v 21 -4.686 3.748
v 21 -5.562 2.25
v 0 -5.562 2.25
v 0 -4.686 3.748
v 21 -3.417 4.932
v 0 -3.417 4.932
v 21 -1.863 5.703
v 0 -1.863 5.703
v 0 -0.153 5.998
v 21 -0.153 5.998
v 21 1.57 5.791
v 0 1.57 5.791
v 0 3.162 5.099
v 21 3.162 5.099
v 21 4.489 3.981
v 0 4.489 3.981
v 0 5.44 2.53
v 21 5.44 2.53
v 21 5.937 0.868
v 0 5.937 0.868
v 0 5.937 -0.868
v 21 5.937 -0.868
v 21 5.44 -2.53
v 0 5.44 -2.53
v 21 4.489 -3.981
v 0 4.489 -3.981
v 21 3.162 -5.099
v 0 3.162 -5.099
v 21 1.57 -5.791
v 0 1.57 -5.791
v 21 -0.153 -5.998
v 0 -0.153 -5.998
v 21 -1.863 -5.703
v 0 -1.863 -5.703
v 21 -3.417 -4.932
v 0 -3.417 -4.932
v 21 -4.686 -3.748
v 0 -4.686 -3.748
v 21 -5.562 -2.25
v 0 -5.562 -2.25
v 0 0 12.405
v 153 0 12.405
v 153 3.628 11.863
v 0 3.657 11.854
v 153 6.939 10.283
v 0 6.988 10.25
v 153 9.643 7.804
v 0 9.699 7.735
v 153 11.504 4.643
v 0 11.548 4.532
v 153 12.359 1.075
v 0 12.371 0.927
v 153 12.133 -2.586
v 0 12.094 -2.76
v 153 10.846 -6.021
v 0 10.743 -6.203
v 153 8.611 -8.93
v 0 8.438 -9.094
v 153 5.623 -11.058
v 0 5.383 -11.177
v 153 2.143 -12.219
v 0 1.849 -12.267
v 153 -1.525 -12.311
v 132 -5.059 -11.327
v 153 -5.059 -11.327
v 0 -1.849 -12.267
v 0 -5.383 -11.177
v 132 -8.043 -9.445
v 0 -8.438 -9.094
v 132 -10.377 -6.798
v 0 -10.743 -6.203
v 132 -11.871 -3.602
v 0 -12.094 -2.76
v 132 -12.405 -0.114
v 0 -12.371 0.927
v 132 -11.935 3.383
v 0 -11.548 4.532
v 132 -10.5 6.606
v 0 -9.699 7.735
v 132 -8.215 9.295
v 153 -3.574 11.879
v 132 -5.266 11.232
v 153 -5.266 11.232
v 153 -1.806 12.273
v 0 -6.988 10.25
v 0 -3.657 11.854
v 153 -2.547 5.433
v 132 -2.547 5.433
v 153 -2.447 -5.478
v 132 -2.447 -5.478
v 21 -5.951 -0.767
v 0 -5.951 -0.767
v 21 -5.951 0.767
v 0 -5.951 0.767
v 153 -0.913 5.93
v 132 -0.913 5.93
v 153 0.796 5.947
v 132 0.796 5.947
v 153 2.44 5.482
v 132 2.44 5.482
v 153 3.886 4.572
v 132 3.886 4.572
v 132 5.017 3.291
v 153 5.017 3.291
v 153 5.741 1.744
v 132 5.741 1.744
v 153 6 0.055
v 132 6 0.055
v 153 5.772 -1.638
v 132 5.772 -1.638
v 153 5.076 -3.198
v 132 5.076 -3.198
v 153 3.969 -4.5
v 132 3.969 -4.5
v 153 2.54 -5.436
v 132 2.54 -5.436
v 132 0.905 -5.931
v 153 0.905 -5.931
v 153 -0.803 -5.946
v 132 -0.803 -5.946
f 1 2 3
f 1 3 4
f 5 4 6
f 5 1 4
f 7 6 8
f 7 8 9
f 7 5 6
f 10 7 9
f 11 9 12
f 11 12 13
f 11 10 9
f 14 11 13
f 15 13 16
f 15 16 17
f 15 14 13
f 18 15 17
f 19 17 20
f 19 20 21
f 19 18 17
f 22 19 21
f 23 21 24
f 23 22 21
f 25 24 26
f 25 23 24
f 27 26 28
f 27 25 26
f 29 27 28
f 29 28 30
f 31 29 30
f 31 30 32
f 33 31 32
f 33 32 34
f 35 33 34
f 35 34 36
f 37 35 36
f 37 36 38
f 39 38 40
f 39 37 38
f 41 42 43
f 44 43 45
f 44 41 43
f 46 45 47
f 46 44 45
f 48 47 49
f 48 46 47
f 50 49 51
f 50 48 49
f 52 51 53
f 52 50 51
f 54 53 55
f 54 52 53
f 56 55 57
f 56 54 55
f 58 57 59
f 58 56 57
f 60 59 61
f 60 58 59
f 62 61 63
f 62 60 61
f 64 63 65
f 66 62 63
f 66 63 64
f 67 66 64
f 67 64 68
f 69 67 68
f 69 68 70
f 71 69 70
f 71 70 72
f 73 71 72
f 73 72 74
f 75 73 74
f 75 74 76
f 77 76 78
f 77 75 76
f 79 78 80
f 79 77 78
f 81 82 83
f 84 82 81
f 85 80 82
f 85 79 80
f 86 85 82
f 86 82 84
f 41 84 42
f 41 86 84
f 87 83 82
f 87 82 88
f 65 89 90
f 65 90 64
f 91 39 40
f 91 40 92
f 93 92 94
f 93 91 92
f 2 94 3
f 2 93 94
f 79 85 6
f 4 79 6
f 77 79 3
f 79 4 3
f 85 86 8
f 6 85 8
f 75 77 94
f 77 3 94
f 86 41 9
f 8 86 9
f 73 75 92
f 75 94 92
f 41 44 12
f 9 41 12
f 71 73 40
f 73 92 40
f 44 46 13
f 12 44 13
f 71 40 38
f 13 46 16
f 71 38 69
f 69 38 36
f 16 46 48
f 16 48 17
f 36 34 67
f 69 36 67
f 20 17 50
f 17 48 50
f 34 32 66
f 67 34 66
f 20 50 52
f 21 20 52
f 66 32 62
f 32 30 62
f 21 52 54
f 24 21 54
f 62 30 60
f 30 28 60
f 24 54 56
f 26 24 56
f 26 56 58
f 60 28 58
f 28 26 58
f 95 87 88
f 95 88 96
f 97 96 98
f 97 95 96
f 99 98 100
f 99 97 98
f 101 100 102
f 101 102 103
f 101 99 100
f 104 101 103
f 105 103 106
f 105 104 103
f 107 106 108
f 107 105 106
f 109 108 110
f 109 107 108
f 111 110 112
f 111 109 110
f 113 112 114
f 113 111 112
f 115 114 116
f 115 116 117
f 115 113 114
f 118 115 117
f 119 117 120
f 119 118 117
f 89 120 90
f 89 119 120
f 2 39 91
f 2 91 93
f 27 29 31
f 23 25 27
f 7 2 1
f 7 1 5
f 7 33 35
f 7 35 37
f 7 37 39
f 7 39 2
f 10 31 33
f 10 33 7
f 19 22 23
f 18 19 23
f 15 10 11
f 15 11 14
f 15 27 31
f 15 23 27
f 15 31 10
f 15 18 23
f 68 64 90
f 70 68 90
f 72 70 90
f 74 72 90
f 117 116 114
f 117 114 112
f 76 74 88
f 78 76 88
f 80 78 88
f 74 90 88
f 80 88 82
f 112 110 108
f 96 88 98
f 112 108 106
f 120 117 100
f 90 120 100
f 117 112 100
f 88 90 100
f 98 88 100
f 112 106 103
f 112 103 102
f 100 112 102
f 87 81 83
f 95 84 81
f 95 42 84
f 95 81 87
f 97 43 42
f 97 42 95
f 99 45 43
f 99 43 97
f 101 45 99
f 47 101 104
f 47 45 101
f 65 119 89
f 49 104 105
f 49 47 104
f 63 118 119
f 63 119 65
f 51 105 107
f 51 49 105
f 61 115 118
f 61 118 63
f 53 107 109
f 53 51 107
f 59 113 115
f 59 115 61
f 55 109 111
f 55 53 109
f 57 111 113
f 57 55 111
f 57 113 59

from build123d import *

# Parameters (mm, degrees)
IZIM1_W               = 153
IZIM1_H               = 12.405405405
KES_EKSTR_ZYON1_DEPTH = 21
KES_EKSTR_ZYON2_START = -21
KES_EKSTR_ZYON2_DEPTH = 21


with BuildPart() as part:
    # Çizim1 → Döndür1 (revolve)
    with BuildSketch(Plane(origin=(0, 0, 0), x_dir=(-1, 0, 0), z_dir=(0, 0, -1)), mode=Mode.PRIVATE) as d_nd_r1_sk:
        with Locations((-76.5, 6.202702703)):
            Rectangle(IZIM1_W, IZIM1_H)
    revolve(d_nd_r1_sk.sketch.rotate(Axis((153, 0, 0), (-1, 0, 0)), 270), axis=Axis((153, 0, 0), (-1, 0, 0)))

    # Çizim2 → Kes-Ekstrüzyon1 (cut)
    with BuildSketch(Plane(origin=(153, 0, 0), x_dir=(0, 0, -1), z_dir=(1, 0, 0))):
        with BuildLine():
            Line((5.478492651, -2.446654506), (11.327153725, -5.058623505))
            ThreePointArc((11.327153725, -5.058623505), (0.113988201, -12.404881699), (-11.232281693, -5.26592169))
            Line((-11.232281693, -5.26592169), (-5.432606832, -2.546916373))
            ThreePointArc((-5.432606832, -2.546916373), (-0.055131548, 5.999746704), (5.478492651, -2.446654506))
        make_face()
    extrude(amount=-KES_EKSTR_ZYON1_DEPTH, mode=Mode.SUBTRACT)

    # Çizim3 → Kes-Ekstrüzyon2 (cut)
    with BuildSketch(Plane.ZY.offset(KES_EKSTR_ZYON2_START)):
        with BuildLine():
            ThreePointArc((2.25, -5.562148865), (0, 6), (-2.25, -5.562148865))
            ThreePointArc((-2.25, -5.562148865), (0, -6), (2.25, -5.562148865))
        make_face()
    extrude(amount=KES_EKSTR_ZYON2_DEPTH, mode=Mode.SUBTRACT)


solid = part.part
